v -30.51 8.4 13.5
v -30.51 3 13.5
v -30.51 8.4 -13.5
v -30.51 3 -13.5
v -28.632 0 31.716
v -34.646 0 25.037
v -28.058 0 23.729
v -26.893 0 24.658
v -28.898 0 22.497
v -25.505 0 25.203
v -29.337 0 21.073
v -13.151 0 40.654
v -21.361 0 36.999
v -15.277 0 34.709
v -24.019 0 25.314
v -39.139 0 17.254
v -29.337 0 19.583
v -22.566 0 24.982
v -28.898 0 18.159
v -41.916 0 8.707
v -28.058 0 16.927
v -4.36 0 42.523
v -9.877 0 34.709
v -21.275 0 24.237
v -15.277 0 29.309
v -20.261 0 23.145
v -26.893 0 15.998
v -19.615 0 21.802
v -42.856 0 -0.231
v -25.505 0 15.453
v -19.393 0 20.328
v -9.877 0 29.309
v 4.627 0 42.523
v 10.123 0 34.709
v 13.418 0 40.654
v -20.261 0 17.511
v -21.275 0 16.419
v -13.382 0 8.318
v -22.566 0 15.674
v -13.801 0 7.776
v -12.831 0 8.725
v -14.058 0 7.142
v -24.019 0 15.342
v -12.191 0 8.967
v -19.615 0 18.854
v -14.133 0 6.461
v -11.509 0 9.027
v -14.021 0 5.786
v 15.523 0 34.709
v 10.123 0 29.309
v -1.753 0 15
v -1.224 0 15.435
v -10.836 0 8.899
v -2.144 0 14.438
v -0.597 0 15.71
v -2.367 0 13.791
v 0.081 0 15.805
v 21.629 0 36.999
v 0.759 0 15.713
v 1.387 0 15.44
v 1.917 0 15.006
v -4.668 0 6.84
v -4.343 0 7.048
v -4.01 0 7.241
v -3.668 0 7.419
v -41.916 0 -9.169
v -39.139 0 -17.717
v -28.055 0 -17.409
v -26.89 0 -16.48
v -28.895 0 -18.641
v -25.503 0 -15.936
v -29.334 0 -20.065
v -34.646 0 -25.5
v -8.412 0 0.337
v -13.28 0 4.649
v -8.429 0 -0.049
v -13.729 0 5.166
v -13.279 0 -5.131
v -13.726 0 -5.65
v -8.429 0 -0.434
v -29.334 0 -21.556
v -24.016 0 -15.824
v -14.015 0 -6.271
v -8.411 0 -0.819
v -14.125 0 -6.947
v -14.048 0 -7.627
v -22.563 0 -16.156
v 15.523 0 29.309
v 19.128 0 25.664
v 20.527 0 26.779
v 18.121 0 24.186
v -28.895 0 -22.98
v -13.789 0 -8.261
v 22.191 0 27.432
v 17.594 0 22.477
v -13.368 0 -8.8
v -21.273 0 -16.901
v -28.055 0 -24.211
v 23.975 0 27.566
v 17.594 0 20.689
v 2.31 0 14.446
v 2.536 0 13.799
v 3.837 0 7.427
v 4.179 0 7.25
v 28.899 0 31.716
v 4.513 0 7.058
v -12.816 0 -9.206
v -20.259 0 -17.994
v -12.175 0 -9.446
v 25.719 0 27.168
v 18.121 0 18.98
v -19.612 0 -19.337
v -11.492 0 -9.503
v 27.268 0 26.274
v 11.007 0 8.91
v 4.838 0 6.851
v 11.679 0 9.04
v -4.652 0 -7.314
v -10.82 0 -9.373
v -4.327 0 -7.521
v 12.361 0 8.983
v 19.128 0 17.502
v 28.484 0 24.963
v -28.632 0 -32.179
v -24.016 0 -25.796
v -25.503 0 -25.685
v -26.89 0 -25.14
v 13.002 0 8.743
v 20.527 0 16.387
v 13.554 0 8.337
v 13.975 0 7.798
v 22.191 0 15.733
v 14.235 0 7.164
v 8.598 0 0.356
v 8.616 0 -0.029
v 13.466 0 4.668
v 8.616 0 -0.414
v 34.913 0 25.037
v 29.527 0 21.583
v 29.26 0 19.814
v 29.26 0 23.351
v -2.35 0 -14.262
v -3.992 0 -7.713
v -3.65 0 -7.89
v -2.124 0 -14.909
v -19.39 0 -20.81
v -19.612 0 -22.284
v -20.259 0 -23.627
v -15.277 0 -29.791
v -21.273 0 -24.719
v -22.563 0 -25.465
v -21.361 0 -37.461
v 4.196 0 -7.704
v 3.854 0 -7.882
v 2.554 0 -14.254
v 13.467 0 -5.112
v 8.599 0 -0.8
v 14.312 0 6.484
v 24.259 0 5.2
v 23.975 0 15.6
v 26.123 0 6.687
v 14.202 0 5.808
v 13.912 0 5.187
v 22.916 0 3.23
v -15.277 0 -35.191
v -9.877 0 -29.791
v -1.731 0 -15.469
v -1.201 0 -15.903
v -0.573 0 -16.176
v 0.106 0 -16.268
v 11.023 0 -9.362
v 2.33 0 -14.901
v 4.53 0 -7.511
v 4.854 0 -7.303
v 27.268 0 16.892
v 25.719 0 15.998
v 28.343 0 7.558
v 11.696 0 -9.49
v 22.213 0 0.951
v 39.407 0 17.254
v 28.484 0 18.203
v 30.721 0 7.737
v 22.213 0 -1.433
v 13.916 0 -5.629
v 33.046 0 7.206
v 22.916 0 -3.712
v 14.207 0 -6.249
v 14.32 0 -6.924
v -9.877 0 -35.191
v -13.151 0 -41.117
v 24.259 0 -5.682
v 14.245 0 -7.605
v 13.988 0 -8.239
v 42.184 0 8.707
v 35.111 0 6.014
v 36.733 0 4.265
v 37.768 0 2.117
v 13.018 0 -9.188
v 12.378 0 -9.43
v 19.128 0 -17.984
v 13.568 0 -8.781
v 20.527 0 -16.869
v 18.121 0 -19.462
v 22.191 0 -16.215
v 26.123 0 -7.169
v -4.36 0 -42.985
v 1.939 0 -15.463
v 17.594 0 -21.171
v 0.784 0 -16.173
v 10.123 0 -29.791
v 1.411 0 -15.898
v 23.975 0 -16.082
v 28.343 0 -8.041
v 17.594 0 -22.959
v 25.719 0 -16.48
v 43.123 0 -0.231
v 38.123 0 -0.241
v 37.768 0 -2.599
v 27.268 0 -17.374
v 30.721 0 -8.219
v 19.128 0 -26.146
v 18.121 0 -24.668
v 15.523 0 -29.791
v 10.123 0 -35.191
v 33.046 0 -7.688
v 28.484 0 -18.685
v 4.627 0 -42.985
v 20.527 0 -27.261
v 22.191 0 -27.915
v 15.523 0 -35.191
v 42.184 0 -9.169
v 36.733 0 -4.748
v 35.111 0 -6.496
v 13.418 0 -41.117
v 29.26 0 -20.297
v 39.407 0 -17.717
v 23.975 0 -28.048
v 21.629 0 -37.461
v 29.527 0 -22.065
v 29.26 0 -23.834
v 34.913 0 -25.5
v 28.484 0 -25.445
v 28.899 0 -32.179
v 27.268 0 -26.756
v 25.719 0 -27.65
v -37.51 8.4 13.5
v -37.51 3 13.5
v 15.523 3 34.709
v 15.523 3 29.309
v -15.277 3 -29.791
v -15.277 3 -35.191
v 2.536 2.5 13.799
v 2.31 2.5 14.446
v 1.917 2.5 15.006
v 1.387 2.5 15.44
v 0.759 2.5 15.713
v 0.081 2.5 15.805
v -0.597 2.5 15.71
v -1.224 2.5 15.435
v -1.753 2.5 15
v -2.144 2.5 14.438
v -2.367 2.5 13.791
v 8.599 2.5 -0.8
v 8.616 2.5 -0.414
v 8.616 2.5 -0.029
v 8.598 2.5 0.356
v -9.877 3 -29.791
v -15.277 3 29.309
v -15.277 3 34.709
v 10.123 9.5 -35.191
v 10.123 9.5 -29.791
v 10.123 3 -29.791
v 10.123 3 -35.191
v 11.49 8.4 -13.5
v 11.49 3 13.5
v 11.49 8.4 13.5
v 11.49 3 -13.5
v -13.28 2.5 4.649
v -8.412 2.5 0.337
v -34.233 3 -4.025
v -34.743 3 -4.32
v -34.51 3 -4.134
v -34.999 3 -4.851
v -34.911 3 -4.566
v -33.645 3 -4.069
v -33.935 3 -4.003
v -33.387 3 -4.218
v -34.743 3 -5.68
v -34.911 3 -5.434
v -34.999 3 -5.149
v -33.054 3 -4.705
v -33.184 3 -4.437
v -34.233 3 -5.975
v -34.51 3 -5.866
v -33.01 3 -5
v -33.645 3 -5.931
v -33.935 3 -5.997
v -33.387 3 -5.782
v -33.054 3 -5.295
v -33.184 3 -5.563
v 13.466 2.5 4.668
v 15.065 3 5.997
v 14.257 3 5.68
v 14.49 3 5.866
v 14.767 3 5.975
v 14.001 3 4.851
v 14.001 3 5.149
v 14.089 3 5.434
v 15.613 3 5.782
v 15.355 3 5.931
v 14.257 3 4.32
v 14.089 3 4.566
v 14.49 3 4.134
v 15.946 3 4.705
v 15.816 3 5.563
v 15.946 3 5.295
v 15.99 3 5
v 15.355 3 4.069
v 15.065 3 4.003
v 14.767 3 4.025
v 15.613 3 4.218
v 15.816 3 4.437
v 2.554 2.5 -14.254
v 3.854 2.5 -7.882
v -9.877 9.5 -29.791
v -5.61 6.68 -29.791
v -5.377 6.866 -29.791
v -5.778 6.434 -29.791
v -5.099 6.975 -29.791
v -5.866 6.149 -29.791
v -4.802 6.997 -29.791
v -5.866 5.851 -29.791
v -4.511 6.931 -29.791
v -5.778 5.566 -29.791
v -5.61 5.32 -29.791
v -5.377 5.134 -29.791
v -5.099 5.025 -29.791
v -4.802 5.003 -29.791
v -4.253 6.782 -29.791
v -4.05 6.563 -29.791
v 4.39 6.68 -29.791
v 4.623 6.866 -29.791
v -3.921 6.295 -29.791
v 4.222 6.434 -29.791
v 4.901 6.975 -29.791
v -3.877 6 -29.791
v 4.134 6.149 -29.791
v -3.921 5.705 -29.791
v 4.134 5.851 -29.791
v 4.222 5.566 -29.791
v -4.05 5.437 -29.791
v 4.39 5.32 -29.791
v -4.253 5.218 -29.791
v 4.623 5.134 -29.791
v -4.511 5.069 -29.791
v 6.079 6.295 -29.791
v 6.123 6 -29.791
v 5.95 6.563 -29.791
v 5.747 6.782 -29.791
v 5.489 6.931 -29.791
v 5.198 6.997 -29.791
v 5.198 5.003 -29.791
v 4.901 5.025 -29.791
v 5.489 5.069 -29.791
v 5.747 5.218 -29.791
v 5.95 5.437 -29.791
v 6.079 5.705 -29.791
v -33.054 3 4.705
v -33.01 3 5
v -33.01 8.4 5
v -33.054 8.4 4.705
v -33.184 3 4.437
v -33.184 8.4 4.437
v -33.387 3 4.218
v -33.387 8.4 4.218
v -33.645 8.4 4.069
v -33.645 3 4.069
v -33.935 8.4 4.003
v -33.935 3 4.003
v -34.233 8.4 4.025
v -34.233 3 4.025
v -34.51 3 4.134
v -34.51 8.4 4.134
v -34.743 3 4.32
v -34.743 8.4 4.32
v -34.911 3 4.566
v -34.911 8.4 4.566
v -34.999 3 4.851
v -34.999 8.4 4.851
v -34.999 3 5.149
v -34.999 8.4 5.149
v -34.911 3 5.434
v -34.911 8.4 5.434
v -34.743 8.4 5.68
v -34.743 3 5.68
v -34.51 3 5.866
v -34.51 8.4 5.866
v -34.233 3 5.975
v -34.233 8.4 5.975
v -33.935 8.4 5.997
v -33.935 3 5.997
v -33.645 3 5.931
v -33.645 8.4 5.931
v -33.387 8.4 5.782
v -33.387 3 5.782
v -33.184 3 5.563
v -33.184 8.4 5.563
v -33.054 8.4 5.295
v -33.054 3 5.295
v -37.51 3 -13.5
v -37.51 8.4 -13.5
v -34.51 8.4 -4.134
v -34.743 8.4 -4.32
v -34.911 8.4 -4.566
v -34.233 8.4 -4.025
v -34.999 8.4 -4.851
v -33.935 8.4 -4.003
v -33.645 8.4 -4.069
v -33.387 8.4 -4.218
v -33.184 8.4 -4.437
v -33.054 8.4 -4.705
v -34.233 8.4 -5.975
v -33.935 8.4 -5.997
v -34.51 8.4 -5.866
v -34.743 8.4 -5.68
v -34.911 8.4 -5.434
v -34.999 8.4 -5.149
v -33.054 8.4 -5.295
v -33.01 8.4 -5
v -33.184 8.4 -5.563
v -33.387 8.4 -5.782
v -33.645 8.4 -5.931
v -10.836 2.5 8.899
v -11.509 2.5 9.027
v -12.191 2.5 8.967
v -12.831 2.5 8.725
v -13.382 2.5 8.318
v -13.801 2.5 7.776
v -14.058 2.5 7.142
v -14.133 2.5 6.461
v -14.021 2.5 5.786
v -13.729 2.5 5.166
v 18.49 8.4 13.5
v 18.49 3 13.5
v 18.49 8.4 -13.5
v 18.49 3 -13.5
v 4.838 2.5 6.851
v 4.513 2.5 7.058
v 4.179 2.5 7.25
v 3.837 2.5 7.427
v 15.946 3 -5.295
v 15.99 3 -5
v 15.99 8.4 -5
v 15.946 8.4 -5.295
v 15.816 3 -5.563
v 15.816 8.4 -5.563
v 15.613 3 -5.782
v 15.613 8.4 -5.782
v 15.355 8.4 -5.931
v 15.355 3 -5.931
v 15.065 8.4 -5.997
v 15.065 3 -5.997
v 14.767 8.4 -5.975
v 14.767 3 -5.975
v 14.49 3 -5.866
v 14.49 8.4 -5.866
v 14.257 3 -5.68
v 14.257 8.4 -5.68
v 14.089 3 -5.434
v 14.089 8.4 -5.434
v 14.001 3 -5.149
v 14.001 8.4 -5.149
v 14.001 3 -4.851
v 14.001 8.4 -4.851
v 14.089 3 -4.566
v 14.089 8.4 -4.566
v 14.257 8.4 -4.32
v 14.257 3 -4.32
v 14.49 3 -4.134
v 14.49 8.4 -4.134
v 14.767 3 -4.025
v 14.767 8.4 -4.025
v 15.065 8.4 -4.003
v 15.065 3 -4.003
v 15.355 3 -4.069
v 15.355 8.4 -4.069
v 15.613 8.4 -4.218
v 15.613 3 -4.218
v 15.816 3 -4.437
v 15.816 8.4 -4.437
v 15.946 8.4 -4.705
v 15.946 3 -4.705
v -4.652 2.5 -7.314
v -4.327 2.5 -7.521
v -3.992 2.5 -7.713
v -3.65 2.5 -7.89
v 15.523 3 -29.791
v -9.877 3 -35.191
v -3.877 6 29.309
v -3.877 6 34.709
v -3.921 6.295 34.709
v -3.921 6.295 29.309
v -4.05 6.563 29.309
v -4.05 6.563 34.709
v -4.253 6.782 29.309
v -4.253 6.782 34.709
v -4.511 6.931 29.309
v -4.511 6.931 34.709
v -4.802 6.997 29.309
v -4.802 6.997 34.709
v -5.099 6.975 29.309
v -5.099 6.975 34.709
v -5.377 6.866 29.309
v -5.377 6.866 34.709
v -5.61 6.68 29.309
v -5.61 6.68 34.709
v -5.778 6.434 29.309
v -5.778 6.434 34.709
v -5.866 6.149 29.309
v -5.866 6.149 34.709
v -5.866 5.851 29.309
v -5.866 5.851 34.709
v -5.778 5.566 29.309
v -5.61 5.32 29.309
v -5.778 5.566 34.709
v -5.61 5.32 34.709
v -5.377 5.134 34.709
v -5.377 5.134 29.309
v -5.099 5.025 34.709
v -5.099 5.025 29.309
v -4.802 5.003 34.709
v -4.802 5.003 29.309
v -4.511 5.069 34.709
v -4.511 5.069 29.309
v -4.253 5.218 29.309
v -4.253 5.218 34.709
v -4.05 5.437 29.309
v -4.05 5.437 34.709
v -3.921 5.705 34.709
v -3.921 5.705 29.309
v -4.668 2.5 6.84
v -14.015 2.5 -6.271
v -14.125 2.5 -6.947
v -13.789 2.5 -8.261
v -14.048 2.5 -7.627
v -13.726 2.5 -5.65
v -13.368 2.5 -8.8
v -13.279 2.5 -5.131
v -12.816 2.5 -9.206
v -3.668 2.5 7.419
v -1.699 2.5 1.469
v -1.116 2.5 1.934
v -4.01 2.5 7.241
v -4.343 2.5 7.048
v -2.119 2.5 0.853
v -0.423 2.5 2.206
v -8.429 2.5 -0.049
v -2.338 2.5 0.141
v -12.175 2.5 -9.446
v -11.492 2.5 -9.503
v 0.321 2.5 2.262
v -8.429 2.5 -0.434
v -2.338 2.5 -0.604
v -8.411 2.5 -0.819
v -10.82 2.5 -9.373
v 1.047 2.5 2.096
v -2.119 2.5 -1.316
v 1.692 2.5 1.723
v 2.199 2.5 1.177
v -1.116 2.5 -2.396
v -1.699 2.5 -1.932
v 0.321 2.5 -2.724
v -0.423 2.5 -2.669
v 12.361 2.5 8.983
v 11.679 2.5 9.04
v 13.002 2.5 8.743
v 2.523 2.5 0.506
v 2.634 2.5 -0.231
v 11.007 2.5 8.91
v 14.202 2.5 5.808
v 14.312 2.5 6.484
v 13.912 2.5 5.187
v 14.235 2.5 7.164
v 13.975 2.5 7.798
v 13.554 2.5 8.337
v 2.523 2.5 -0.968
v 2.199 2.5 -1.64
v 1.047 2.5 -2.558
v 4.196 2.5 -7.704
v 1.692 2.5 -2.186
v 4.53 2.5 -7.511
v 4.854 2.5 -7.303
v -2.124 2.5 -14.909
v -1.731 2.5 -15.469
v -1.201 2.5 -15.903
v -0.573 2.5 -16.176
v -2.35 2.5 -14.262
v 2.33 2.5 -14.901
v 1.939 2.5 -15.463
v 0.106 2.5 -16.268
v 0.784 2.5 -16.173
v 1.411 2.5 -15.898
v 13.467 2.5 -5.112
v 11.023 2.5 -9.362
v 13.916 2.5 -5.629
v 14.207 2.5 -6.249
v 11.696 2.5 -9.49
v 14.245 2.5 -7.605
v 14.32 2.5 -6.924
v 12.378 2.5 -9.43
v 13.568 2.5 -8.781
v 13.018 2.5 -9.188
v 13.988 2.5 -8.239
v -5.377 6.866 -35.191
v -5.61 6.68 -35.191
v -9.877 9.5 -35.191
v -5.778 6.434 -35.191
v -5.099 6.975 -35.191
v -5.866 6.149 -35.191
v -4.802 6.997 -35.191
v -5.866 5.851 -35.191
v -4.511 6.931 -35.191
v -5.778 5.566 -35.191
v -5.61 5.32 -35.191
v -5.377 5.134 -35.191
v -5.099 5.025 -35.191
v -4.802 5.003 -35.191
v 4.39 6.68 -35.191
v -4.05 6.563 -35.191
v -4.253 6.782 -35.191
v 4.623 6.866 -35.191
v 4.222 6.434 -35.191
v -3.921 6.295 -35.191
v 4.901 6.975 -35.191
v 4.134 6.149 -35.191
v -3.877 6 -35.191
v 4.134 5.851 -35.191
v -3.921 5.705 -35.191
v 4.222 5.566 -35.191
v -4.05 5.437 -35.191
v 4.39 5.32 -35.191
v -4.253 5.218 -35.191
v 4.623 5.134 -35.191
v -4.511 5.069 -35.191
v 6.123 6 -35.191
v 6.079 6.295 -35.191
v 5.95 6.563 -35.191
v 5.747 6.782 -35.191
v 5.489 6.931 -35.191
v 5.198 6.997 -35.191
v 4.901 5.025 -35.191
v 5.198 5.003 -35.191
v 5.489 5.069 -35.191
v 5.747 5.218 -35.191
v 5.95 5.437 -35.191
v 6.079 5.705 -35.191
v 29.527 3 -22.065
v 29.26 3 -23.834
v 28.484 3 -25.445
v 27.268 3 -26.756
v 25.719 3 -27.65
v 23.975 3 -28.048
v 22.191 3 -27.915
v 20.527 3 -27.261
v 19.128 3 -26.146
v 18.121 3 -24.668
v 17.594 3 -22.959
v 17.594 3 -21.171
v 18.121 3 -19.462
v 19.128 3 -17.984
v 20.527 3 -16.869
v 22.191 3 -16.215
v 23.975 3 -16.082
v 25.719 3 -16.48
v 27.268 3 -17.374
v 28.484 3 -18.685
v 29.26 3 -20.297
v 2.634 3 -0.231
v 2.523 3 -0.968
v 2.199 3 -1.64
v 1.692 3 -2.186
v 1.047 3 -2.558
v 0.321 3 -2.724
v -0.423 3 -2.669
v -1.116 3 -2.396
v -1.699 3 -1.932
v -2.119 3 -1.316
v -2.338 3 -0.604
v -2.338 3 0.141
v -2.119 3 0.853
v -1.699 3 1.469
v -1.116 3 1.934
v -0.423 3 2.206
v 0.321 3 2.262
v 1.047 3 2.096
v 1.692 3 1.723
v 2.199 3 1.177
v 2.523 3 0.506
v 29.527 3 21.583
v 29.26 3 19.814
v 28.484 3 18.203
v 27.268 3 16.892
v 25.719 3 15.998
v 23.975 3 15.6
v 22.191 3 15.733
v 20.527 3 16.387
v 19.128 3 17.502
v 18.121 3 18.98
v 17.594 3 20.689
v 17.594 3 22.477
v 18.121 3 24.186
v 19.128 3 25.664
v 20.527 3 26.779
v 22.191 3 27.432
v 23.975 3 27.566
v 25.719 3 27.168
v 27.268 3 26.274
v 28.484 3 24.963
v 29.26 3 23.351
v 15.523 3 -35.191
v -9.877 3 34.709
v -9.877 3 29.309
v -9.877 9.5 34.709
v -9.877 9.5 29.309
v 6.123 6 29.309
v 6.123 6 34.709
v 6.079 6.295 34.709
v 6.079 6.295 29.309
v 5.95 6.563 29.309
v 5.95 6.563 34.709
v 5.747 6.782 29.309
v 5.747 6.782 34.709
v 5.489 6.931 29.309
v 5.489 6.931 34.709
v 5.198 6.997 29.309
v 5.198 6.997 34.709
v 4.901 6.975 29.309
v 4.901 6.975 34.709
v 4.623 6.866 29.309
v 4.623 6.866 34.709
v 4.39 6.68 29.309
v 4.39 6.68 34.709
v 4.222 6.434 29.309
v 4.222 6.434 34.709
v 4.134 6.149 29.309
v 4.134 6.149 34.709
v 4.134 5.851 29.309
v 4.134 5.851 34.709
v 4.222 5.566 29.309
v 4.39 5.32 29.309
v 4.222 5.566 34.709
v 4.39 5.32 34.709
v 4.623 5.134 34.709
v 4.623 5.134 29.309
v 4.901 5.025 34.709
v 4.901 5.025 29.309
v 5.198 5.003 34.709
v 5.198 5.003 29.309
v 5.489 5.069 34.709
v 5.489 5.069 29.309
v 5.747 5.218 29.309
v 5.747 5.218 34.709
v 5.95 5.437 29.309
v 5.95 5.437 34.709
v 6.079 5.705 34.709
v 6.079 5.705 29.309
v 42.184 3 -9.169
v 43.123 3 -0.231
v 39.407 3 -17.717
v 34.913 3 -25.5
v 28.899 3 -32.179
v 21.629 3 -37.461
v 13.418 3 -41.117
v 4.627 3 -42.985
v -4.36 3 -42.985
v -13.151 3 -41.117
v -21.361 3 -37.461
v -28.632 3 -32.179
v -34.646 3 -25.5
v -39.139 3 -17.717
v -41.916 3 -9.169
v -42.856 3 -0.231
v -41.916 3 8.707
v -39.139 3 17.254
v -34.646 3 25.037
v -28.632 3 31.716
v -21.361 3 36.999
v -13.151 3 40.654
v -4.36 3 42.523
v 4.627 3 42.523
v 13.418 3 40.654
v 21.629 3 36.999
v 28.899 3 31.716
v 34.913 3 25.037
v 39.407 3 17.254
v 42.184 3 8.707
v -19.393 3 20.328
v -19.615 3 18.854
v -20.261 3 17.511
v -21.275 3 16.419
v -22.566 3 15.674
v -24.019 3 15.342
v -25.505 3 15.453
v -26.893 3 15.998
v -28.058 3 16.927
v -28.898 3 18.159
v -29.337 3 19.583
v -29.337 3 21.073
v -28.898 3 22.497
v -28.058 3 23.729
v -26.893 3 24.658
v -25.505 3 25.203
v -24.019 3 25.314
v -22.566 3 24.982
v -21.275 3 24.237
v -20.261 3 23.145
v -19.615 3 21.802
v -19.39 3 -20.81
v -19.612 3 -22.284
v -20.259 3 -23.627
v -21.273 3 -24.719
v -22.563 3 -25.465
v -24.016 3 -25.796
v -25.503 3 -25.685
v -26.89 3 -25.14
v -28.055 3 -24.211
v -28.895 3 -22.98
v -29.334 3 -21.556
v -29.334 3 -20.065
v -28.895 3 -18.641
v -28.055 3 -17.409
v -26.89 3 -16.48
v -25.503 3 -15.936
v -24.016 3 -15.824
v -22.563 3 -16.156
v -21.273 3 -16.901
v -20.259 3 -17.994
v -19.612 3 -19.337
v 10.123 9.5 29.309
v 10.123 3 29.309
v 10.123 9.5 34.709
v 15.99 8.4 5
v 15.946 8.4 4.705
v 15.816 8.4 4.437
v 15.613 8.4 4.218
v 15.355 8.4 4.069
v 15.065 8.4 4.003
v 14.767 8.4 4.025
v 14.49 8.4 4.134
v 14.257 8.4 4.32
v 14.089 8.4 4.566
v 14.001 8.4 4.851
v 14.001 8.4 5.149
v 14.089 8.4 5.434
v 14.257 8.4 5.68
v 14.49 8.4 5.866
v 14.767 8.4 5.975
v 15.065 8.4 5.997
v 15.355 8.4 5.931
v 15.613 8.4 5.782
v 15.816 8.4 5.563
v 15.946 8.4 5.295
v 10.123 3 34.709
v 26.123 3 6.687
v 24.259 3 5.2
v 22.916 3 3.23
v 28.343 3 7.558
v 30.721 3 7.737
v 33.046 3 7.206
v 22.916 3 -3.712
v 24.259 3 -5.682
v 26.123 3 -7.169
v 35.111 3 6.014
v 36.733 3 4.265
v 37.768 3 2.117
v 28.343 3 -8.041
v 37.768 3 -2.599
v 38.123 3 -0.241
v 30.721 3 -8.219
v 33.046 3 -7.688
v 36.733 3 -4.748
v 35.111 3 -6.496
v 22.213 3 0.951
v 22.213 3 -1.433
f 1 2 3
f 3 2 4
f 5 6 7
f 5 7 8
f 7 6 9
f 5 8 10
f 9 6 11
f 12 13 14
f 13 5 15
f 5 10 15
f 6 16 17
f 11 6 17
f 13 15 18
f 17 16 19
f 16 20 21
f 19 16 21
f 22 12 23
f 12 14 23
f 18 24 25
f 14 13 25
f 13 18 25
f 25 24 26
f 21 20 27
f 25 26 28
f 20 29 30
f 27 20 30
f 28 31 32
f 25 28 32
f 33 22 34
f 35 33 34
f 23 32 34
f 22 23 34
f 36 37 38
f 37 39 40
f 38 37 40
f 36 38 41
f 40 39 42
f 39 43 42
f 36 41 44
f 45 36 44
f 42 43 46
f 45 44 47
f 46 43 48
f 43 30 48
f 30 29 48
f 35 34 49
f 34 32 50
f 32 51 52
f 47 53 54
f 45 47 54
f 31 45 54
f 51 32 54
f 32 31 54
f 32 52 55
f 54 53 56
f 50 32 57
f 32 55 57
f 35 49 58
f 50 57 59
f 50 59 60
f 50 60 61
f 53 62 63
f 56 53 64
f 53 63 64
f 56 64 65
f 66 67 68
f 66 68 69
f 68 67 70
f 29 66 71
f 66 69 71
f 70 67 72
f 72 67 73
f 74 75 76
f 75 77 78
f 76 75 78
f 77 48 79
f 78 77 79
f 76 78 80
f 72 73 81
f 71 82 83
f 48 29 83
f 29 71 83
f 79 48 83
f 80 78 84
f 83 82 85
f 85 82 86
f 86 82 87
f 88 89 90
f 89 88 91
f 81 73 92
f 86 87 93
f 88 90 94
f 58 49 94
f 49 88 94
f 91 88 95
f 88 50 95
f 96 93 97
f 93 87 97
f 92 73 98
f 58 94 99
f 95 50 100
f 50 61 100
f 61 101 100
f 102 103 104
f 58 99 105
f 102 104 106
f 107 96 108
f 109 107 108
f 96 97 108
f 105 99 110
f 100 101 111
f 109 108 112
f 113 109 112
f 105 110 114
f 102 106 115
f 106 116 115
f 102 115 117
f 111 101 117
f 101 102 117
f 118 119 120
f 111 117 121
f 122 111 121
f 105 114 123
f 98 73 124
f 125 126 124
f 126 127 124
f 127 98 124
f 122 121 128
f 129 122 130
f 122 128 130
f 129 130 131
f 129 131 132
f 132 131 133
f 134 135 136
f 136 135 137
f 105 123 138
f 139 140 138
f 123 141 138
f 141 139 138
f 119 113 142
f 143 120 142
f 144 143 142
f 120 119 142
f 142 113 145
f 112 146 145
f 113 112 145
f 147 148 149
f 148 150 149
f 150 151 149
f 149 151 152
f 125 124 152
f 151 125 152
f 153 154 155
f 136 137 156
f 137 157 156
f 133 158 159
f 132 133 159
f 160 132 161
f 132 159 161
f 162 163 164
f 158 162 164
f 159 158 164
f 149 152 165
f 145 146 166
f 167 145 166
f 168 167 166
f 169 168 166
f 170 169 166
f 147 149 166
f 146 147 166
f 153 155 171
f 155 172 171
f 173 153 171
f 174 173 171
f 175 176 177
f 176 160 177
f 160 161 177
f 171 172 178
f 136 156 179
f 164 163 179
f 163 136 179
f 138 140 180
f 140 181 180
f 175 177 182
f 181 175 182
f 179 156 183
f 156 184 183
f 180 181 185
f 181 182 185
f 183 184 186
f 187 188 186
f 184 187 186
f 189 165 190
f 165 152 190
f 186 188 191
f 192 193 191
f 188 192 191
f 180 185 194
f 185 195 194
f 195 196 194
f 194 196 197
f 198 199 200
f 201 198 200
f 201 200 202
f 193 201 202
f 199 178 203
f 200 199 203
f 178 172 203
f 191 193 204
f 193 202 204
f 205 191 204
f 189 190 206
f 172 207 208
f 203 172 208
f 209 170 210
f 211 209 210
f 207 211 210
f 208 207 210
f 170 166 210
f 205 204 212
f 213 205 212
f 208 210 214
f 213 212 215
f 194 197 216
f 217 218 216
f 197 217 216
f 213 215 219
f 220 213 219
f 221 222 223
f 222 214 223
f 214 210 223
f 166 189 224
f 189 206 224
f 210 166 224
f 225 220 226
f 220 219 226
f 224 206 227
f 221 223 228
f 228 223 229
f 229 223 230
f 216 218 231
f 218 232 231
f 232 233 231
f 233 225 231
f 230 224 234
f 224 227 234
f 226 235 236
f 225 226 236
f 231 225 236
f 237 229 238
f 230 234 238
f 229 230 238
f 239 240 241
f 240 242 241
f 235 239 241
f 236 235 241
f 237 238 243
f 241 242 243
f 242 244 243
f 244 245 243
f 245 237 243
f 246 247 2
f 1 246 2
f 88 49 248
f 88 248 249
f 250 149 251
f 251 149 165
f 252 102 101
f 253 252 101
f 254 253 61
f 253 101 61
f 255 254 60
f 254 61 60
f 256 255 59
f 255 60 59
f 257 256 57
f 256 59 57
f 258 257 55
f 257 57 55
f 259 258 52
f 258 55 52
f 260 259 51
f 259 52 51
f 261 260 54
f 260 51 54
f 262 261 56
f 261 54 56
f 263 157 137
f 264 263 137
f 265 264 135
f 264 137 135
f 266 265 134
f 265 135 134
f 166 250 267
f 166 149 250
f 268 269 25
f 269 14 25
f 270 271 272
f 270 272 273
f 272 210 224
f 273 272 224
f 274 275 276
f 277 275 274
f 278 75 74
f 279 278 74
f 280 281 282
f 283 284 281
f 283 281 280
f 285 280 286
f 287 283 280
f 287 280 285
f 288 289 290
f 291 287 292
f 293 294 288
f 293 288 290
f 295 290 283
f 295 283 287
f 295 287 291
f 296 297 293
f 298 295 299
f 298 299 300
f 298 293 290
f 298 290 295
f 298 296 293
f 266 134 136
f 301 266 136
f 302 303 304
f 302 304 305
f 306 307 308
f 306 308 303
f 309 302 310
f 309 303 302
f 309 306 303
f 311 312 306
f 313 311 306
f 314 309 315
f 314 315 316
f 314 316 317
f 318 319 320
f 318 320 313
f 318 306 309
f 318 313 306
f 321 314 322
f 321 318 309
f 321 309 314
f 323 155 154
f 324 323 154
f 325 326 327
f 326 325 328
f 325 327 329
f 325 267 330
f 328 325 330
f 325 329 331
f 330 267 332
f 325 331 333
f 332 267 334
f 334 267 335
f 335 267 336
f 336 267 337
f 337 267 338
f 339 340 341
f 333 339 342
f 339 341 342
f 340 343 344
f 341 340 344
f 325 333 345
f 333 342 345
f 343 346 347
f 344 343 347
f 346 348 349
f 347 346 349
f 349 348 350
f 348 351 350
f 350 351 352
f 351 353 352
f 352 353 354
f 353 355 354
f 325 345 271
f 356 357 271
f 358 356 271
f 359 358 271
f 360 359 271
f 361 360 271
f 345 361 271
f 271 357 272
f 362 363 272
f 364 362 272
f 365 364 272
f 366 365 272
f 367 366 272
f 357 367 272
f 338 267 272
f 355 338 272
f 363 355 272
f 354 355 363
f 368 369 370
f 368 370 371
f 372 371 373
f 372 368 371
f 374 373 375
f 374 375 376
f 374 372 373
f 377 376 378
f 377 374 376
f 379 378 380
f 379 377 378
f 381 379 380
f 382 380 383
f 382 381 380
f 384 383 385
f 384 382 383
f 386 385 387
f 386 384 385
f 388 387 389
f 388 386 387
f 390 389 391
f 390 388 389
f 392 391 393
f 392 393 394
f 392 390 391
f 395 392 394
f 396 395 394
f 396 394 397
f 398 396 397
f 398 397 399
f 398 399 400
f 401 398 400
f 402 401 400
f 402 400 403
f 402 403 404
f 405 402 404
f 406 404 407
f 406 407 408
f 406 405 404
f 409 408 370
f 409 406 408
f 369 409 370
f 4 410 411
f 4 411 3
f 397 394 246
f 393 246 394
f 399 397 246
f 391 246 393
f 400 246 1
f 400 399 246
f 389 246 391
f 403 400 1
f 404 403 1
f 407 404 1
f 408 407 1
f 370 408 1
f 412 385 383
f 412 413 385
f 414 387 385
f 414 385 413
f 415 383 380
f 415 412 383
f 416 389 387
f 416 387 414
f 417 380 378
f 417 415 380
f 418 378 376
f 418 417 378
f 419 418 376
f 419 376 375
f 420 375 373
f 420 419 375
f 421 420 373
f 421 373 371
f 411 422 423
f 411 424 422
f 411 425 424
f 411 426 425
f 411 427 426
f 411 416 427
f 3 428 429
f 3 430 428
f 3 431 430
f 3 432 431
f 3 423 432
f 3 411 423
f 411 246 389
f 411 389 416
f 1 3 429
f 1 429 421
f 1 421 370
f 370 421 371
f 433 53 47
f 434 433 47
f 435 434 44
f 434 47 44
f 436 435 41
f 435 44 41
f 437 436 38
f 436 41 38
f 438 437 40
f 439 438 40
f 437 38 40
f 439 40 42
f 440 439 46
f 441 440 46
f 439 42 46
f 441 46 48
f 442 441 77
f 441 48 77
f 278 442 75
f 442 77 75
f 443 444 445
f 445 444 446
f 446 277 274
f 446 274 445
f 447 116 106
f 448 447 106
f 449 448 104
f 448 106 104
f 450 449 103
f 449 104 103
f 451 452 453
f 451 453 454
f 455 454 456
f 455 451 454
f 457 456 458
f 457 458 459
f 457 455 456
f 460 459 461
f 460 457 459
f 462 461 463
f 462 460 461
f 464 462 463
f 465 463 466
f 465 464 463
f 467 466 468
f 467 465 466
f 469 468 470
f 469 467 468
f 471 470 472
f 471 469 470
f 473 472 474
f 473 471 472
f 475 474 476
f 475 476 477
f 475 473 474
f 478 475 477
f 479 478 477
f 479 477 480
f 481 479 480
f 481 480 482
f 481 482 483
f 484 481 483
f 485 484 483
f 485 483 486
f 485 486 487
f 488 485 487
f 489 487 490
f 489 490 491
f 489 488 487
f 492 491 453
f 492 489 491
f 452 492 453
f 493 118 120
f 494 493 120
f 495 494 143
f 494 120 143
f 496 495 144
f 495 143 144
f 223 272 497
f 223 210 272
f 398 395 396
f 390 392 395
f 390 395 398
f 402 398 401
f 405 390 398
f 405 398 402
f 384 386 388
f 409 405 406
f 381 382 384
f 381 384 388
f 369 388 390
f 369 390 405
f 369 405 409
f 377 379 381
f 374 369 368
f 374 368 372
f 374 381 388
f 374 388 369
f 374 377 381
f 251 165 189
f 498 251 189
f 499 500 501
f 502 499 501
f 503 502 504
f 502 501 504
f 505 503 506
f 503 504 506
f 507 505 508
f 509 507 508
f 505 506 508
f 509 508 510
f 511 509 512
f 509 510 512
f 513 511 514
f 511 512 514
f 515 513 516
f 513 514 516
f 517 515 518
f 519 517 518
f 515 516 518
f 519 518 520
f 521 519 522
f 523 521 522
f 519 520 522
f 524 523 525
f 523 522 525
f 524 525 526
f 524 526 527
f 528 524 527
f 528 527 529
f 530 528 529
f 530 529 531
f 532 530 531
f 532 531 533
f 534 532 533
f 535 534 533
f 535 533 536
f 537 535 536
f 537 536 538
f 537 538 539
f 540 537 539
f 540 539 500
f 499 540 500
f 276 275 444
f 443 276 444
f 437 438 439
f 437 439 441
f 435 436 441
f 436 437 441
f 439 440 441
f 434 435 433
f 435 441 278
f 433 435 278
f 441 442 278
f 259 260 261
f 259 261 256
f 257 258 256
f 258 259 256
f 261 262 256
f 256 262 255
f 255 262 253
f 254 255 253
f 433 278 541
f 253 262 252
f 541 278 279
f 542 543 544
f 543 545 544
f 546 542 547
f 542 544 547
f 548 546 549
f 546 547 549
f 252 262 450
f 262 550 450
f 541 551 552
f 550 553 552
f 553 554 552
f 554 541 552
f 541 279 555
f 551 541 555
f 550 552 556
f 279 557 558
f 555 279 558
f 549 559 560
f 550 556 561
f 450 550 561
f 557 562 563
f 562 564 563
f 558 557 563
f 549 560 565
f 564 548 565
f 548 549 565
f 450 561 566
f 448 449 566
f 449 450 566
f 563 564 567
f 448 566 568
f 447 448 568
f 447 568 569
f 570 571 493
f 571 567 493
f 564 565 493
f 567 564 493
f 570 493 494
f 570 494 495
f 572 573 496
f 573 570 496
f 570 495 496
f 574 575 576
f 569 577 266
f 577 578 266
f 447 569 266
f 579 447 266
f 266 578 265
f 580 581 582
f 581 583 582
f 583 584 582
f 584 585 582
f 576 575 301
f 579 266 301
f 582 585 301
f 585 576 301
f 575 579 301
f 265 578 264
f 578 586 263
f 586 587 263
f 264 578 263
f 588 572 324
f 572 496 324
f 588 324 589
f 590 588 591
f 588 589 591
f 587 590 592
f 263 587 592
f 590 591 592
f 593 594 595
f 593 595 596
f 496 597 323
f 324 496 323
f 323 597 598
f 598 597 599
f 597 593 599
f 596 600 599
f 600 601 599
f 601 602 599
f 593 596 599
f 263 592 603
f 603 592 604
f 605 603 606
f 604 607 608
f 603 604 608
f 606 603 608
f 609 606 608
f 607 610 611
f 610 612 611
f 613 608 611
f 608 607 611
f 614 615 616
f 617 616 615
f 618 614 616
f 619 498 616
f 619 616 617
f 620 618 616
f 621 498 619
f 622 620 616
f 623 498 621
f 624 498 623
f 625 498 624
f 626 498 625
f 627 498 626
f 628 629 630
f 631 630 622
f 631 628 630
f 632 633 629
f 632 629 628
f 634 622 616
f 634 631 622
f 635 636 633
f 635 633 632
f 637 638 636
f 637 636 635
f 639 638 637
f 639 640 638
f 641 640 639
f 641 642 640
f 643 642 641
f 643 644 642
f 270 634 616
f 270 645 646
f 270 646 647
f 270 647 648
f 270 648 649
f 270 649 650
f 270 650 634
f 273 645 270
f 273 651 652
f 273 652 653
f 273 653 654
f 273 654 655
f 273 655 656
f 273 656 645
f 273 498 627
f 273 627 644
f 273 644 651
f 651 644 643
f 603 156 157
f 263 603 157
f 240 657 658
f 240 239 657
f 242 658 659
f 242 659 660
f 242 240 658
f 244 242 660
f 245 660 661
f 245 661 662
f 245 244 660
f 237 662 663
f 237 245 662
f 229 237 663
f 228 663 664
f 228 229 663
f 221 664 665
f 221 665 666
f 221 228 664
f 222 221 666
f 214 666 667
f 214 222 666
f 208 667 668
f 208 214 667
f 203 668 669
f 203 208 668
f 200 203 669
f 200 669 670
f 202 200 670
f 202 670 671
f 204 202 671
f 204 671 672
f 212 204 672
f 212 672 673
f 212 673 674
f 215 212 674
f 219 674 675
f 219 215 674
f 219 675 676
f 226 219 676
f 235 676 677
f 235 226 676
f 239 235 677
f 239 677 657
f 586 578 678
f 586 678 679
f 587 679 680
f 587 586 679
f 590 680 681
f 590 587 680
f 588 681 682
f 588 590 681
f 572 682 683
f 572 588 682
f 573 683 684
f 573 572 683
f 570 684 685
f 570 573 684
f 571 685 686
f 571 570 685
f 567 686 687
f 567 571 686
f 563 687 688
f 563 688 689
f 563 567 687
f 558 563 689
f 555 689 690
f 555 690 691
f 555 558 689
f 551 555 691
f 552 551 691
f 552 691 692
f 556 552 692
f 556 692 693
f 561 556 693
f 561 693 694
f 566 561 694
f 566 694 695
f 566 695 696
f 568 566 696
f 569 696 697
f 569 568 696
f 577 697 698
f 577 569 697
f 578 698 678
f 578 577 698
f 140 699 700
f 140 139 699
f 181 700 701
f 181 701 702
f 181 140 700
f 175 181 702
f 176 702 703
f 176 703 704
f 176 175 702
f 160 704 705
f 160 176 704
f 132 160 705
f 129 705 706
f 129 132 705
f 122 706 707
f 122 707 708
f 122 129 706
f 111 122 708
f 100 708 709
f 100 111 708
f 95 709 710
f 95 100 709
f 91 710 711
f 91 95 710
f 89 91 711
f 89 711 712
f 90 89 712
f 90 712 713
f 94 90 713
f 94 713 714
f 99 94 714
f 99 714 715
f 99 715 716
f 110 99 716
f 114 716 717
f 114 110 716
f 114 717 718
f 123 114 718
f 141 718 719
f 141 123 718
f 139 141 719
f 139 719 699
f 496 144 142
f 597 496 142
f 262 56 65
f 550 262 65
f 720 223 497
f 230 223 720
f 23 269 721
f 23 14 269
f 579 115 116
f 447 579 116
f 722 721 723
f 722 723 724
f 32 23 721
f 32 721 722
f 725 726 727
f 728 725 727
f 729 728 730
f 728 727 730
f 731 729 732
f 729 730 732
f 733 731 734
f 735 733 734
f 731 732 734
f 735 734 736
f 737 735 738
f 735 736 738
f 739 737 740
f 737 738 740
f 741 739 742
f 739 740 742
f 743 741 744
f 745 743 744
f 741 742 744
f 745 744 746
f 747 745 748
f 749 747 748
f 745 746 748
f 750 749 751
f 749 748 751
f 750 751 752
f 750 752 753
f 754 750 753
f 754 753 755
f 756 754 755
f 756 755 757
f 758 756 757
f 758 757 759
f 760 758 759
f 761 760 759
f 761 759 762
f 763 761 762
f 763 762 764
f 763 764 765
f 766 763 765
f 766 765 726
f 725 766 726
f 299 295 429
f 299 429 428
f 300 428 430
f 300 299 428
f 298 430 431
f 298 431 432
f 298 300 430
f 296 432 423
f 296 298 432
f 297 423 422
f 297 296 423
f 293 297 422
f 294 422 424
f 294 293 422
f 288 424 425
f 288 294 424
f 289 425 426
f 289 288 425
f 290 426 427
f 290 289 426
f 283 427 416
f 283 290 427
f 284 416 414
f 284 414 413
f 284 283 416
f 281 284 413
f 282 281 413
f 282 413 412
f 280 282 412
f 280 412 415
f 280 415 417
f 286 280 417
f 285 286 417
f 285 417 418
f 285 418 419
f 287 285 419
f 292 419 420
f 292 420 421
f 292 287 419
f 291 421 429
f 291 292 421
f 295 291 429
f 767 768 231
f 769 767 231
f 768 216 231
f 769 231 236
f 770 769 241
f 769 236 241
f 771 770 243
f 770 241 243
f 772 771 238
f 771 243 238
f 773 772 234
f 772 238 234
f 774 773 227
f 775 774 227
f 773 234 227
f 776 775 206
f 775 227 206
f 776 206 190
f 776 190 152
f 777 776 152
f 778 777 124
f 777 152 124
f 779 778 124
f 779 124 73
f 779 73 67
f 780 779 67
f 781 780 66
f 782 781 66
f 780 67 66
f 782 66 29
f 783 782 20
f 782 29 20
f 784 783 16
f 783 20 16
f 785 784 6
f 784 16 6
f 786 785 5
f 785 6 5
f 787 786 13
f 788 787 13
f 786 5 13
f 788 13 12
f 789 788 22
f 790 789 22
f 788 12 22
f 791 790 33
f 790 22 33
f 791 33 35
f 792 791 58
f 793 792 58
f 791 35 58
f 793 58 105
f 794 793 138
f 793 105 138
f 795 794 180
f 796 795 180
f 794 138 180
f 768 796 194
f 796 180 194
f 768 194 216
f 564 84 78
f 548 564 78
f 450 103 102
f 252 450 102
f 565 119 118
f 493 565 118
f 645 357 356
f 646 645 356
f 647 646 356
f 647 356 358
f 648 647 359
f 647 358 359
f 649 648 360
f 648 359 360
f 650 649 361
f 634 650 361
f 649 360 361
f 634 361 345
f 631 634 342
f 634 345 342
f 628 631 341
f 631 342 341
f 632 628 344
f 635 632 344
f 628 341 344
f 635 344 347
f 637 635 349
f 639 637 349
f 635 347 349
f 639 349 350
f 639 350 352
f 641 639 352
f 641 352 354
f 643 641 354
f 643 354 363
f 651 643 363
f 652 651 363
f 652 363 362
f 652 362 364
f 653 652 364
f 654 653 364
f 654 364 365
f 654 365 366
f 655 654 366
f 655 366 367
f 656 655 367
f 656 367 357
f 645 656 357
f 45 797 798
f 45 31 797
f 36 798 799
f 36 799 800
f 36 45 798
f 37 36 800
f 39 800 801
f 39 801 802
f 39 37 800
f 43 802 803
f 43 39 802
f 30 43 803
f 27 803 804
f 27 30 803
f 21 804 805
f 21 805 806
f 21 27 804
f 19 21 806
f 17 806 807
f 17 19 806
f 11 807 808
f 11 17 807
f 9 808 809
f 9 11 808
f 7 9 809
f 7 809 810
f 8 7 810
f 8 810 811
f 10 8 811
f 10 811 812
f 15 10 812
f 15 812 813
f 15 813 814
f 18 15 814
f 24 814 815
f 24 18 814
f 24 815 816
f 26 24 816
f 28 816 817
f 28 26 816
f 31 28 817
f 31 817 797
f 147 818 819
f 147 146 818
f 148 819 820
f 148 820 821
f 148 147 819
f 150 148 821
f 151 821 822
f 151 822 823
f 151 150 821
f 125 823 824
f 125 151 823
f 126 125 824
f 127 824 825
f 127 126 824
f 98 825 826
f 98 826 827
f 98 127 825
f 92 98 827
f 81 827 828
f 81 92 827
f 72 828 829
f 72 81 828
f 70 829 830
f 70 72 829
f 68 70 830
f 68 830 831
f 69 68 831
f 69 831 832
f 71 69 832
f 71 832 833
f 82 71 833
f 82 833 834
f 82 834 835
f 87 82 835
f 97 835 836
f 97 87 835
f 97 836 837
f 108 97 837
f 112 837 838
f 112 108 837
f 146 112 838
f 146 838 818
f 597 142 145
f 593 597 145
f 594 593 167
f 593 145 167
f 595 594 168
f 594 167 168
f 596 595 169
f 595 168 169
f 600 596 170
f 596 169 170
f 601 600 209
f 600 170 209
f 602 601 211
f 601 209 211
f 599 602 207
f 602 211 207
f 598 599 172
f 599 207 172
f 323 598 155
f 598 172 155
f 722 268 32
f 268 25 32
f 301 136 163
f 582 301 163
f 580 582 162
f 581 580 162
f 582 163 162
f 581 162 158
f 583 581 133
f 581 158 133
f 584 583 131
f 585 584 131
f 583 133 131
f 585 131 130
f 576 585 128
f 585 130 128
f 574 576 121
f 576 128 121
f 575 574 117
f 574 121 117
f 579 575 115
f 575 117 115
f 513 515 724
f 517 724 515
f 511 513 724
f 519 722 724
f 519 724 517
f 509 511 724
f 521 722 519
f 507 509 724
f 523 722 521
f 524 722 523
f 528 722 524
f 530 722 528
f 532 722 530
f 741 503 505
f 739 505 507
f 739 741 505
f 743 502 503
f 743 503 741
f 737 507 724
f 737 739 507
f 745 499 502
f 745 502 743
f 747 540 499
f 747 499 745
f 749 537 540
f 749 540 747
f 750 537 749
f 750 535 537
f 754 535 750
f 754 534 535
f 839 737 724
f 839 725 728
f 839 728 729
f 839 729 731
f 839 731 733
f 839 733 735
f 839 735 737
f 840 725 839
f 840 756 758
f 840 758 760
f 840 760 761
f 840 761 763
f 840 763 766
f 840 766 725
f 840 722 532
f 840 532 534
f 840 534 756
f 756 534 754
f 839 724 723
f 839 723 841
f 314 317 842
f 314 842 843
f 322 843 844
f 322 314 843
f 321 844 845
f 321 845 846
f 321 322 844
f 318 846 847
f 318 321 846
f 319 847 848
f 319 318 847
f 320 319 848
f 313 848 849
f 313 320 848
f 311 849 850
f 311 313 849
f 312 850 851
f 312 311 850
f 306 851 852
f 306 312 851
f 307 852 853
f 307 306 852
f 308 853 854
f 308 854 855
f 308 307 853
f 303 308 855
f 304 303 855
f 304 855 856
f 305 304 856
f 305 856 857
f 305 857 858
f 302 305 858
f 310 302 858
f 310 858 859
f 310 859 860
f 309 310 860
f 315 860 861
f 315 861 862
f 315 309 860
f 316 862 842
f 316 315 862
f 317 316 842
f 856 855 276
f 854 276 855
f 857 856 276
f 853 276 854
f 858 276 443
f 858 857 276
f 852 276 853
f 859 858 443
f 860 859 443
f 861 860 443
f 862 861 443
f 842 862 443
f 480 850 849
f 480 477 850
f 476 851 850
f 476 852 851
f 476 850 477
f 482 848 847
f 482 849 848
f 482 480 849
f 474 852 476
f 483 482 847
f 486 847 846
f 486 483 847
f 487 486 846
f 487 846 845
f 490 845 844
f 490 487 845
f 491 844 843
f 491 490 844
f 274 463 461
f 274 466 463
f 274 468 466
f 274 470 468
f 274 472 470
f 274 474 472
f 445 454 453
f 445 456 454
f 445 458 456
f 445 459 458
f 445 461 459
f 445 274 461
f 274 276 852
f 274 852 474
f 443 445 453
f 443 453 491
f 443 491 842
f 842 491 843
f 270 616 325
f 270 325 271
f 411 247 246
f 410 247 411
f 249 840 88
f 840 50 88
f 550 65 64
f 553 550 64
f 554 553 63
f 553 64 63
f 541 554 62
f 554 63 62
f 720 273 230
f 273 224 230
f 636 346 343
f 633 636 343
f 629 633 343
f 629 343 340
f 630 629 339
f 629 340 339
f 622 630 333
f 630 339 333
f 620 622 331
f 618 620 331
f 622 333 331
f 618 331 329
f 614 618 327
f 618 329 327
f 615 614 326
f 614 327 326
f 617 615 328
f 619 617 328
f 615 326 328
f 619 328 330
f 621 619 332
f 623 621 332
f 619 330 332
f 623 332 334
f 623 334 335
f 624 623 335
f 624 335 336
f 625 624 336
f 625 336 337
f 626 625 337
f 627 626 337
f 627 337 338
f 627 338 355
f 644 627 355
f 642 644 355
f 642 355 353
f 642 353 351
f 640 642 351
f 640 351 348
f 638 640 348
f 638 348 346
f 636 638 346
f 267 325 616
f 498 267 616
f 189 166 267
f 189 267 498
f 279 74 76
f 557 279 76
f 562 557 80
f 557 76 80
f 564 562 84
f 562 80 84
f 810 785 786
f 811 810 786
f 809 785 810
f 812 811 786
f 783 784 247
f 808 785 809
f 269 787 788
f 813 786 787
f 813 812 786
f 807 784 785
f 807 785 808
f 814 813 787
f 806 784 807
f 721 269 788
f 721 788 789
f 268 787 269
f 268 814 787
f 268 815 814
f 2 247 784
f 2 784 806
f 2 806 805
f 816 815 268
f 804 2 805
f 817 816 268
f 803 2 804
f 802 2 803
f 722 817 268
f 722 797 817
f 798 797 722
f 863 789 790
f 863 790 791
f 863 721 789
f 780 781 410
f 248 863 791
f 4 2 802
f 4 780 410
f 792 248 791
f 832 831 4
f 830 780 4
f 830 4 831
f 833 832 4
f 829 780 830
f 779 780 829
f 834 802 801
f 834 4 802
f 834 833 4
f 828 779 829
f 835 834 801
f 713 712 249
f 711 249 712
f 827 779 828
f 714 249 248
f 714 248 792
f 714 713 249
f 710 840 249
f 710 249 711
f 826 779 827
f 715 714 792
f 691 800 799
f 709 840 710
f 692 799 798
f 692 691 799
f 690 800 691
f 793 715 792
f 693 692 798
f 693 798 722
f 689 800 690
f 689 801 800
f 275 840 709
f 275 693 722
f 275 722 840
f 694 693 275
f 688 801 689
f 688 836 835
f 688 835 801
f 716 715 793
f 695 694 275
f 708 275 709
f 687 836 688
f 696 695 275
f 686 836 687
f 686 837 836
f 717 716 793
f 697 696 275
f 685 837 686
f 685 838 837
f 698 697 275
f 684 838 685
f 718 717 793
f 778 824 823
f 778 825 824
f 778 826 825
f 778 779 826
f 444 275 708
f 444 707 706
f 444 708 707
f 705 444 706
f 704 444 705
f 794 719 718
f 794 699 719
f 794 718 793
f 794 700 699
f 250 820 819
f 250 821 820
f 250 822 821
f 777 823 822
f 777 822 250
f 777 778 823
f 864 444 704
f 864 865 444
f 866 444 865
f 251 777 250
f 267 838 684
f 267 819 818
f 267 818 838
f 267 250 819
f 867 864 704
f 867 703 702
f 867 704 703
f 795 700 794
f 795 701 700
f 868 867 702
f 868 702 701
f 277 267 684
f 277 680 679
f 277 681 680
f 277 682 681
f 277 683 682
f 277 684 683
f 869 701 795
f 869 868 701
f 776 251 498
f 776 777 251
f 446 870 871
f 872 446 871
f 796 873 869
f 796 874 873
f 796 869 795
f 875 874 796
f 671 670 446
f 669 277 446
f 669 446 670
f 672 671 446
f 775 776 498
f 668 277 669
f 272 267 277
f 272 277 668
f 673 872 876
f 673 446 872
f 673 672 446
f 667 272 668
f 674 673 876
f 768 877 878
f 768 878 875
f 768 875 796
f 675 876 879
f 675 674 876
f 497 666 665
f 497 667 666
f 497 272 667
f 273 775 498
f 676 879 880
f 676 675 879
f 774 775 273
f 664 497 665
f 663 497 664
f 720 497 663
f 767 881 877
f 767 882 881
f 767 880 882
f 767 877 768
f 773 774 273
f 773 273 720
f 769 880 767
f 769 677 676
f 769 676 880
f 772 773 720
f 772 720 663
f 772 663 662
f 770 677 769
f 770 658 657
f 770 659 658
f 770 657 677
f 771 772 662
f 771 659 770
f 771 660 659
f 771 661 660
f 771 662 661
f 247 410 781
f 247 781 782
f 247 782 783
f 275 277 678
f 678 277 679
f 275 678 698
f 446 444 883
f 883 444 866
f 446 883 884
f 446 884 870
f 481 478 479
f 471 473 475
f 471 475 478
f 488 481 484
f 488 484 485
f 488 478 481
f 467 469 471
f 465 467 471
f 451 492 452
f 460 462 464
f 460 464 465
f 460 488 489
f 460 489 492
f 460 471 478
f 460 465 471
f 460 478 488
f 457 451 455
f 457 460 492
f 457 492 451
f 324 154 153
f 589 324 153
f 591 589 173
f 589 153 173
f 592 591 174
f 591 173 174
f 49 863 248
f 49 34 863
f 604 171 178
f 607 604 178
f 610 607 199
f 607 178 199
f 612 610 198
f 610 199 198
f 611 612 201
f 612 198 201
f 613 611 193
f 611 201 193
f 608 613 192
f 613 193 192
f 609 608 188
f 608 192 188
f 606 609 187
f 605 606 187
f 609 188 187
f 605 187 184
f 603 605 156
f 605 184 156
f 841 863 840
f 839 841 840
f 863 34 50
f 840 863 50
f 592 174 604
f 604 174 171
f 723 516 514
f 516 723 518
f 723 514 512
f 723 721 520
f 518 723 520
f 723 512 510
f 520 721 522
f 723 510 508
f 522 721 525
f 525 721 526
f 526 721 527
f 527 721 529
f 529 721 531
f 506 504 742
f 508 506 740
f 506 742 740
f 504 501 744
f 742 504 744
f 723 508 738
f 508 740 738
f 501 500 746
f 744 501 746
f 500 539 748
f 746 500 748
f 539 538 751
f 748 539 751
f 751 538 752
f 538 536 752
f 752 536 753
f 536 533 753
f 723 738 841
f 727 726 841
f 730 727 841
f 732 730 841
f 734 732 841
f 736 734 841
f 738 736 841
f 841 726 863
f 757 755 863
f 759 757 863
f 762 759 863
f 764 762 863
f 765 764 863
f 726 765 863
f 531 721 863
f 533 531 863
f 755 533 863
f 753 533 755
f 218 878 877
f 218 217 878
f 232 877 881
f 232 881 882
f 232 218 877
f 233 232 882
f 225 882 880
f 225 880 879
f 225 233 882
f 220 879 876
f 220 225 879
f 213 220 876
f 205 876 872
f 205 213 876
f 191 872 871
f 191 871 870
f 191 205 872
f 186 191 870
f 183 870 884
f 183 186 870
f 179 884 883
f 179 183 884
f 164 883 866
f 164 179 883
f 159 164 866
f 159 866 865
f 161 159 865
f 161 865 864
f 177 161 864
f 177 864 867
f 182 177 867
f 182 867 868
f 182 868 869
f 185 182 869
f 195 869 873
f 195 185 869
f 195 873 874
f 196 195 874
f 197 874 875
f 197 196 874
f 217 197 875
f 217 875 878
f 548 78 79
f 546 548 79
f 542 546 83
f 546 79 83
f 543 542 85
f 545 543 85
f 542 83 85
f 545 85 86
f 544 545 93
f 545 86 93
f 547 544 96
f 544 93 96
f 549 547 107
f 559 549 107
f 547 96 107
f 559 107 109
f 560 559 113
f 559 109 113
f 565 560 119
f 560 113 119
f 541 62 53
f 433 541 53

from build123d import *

# Parameters (mm, degrees)
CROQUIS1_R              = 42.989543869
CROQUIS1_R_2            = 8.000000719
CROQUIS1_R_3            = 6.000000354
CROQUIS1_R_4            = 4.999998849
CROQUIS1_R_5            = 5.000081965
CROQUIS1_R_6            = 6.000000031
CROQUIS1_W              = 5.400000572
CROQUIS1_H              = 5.400000573
CROQUIS1_W_2            = 5.400001526
CROQUIS1_H_2            = 5.400001526
CROQUIS1_W_3            = 5.400001525
SALIENTE_EXTRUIR1_DEPTH = 2.5
CROQUIS2_R              = 42.989543869
CROQUIS2_R_2            = 5.000081965
CROQUIS2_R_3            = 6.000000031
CROQUIS2_R_4            = 8.000000719
CROQUIS2_R_5            = 6.000000354
CROQUIS2_R_6            = 4.999998849
CROQUIS2_R_7            = 2.5
CROQUIS2_W              = 5.400000572
CROQUIS2_H              = 5.400000573
CROQUIS2_W_2            = 5.400001525
CROQUIS2_H_2            = 5.400001526
CROQUIS2_W_3            = 5.400001526
SALIENTE_EXTRUIR2_DEPTH = 0.5
CROQUIS3_W              = 19.999999047
CROQUIS3_H              = 5.400000573
CROQUIS3_W_2            = 19.999998093
CROQUIS3_H_2            = 5.400001526
SALIENTE_EXTRUIR3_DEPTH = 6.5
CROQUIS4_R              = 1
CORTAR_EXTRUIR1_DEPTH   = 94.5
CROQUIS5_W              = 7.000000953
CROQUIS5_H              = 27
CROQUIS5_R              = 1.000001566
CROQUIS5_W_2            = 7.000000954
SALIENTE_EXTRUIR4_DEPTH = 5.4


with BuildPart() as part:
    # Croquis1 → Saliente-Extruir1 (new body)
    with BuildSketch(Plane(origin=(0, 0, 0), x_dir=(1, 0, 0), z_dir=(0, 1, 0))):
        with Locations((0.133743246, 0.231297164)):
            Circle(CROQUIS1_R)
        with Locations((30.123277351, 0.24111594)):
            Circle(CROQUIS1_R_2, mode=Mode.SUBTRACT)
        with Locations((23.52660556, 22.065066477)):
            Circle(CROQUIS1_R_3, mode=Mode.SUBTRACT)
        with Locations((-24.390140184, 20.810319956)):
            Circle(CROQUIS1_R_4, mode=Mode.SUBTRACT)
        with Locations((-24.392687184, -20.328024023)):
            Circle(CROQUIS1_R_5, mode=Mode.SUBTRACT)
        with Locations((23.526602762, -21.582829156)):
            Circle(CROQUIS1_R_6, mode=Mode.SUBTRACT)
        with BuildLine():
            Line((4.854387983, 7.302748706), (11.022837385, 9.362418202))
            ThreePointArc((11.022837385, 9.362418202), (13.987829641, 8.239301442), (13.466977705, 5.11179707))
            Line((13.466977705, 5.11179707), (8.599027265, 0.799598431))
            ThreePointArc((8.599027265, 0.799598431), (8.617971382, 0.221716337), (8.597699336, -0.356120697))
            Line((8.597699336, -0.356120697), (13.465650144, -4.668319833))
            ThreePointArc((13.465650144, -4.668319833), (13.975498626, -7.797636828), (11.006574422, -8.910318006))
            Line((11.006574422, -8.910318006), (4.838125635, -6.850648581))
            ThreePointArc((4.838125635, -6.850648581), (4.347137119, -7.155995714), (3.836579545, -7.427358125))
            Line((3.836579545, -7.427358125), (2.536080952, -13.799226756))
            ThreePointArc((2.536080952, -13.799226756), (0.080937178, -15.805426992), (-2.36713509, -13.790603798))
            Line((-2.36713509, -13.790603798), (-3.667633438, -7.418735734))
            ThreePointArc((-3.667633438, -7.418735734), (-4.177566071, -7.146200773), (-4.667851599, -6.839726149))
            Line((-4.667851599, -6.839726149), (-10.836301, -8.899395645))
            ThreePointArc((-10.836301, -8.899395645), (-13.801293256, -7.776278885), (-13.28044132, -4.648774514))
            Line((-13.28044132, -4.648774514), (-8.41249088, -0.336575875))
            ThreePointArc((-8.41249088, -0.336575875), (-8.431434998, 0.24130622), (-8.411162951, 0.819143254))
            Line((-8.411162951, 0.819143254), (-13.279113759, 5.131342389))
            ThreePointArc((-13.279113759, 5.131342389), (-13.788962242, 8.260659385), (-10.820038037, 9.373340563))
            Line((-10.820038037, 9.373340563), (-4.65158925, 7.313671137))
            ThreePointArc((-4.65158925, 7.313671137), (-4.160600735, 7.619018271), (-3.65004316, 7.890380681))
            Line((-3.65004316, 7.890380681), (-2.349544567, 14.262249313))
            ThreePointArc((-2.349544567, 14.262249313), (0.105599207, 16.268449549), (2.553671475, 14.253626355))
            Line((2.553671475, 14.253626355), (3.854169823, 7.88175829))
            ThreePointArc((3.854169823, 7.88175829), (4.364102455, 7.60922333), (4.854387983, 7.302748706))
        make_face(mode=Mode.SUBTRACT)
        with Locations((-12.576717154, -32.008881065)):
            Rectangle(CROQUIS1_W, CROQUIS1_H, mode=Mode.SUBTRACT)
        with Locations((12.823282465, -32.008881065)):
            Rectangle(CROQUIS1_W, CROQUIS1_H, mode=Mode.SUBTRACT)
        with Locations((-12.576716677, 32.491118458)):
            Rectangle(CROQUIS1_W_2, CROQUIS1_H_2, mode=Mode.SUBTRACT)
        with Locations((12.823282942, 32.491118458)):
            Rectangle(CROQUIS1_W_3, CROQUIS1_H_2, mode=Mode.SUBTRACT)
    extrude(amount=SALIENTE_EXTRUIR1_DEPTH)

    # Croquis2 → Saliente-Extruir2 (add)
    with BuildSketch(Plane(origin=(0, 2.5, 0), x_dir=(1, 0, 0), z_dir=(0, 1, 0))):
        with Locations((0.133743246, 0.231297164)):
            Circle(CROQUIS2_R)
        with Locations((-24.392687184, -20.328024023)):
            Circle(CROQUIS2_R_2, mode=Mode.SUBTRACT)
        with Locations((23.526602762, -21.582829156)):
            Circle(CROQUIS2_R_3, mode=Mode.SUBTRACT)
        with Locations((30.123277351, 0.24111594)):
            Circle(CROQUIS2_R_4, mode=Mode.SUBTRACT)
        with Locations((23.52660556, 22.065066477)):
            Circle(CROQUIS2_R_5, mode=Mode.SUBTRACT)
        with Locations((-24.390140184, 20.810319956)):
            Circle(CROQUIS2_R_6, mode=Mode.SUBTRACT)
        with Locations((0.133743246, 0.231297164)):
            Circle(CROQUIS2_R_7, mode=Mode.SUBTRACT)
        with Locations((-12.576717154, -32.008881065)):
            Rectangle(CROQUIS2_W, CROQUIS2_H, mode=Mode.SUBTRACT)
        with Locations((12.823282465, -32.008881065)):
            Rectangle(CROQUIS2_W, CROQUIS2_H, mode=Mode.SUBTRACT)
        with Locations((12.823282942, 32.491118458)):
            Rectangle(CROQUIS2_W_2, CROQUIS2_H_2, mode=Mode.SUBTRACT)
        with Locations((-12.576716677, 32.491118458)):
            Rectangle(CROQUIS2_W_3, CROQUIS2_H_2, mode=Mode.SUBTRACT)
    extrude(amount=SALIENTE_EXTRUIR2_DEPTH)

    # Croquis3 → Saliente-Extruir3 (add)
    with BuildSketch(Plane(origin=(0, 3, 0), x_dir=(1, 0, 0), z_dir=(0, 1, 0))):
        with Locations((0.123282655, -32.008881065)):
            Rectangle(CROQUIS3_W, CROQUIS3_H)
        with Locations((0.123283133, 32.491118458)):
            Rectangle(CROQUIS3_W_2, CROQUIS3_H_2)
    extrude(amount=SALIENTE_EXTRUIR3_DEPTH)

    # Croquis4 → Cortar-Extruir1 (cut)
    with BuildSketch(Plane.XY.offset(34.708881352)):
        with Locations((-4.876716868, 6)):
            Circle(CROQUIS4_R)
        with Locations((5.123283132, 6)):
            Circle(CROQUIS4_R)
    extrude(amount=-CORTAR_EXTRUIR1_DEPTH, mode=Mode.SUBTRACT)

    # Croquis5 → Saliente-Extruir4 (add)
    with BuildSketch(Plane(origin=(0, 3, 0), x_dir=(1, 0, 0), z_dir=(0, 1, 0))):
        with Locations((-34.010001431, 0)):
            Rectangle(CROQUIS5_W, CROQUIS5_H)
        with Locations((-34.010010931, 4.999991869)):
            Circle(CROQUIS5_R, mode=Mode.SUBTRACT)
        with Locations((-34.010010931, -4.999998876)):
            Circle(CROQUIS5_R, mode=Mode.SUBTRACT)
        with Locations((14.990000477, 0)):
            Rectangle(CROQUIS5_W_2, CROQUIS5_H)
        with Locations((14.989999497, 4.999991869)):
            Circle(CROQUIS5_R, mode=Mode.SUBTRACT)
        with Locations((14.989999497, -4.999998876)):
            Circle(CROQUIS5_R, mode=Mode.SUBTRACT)
    extrude(amount=SALIENTE_EXTRUIR4_DEPTH)


solid = part.part
